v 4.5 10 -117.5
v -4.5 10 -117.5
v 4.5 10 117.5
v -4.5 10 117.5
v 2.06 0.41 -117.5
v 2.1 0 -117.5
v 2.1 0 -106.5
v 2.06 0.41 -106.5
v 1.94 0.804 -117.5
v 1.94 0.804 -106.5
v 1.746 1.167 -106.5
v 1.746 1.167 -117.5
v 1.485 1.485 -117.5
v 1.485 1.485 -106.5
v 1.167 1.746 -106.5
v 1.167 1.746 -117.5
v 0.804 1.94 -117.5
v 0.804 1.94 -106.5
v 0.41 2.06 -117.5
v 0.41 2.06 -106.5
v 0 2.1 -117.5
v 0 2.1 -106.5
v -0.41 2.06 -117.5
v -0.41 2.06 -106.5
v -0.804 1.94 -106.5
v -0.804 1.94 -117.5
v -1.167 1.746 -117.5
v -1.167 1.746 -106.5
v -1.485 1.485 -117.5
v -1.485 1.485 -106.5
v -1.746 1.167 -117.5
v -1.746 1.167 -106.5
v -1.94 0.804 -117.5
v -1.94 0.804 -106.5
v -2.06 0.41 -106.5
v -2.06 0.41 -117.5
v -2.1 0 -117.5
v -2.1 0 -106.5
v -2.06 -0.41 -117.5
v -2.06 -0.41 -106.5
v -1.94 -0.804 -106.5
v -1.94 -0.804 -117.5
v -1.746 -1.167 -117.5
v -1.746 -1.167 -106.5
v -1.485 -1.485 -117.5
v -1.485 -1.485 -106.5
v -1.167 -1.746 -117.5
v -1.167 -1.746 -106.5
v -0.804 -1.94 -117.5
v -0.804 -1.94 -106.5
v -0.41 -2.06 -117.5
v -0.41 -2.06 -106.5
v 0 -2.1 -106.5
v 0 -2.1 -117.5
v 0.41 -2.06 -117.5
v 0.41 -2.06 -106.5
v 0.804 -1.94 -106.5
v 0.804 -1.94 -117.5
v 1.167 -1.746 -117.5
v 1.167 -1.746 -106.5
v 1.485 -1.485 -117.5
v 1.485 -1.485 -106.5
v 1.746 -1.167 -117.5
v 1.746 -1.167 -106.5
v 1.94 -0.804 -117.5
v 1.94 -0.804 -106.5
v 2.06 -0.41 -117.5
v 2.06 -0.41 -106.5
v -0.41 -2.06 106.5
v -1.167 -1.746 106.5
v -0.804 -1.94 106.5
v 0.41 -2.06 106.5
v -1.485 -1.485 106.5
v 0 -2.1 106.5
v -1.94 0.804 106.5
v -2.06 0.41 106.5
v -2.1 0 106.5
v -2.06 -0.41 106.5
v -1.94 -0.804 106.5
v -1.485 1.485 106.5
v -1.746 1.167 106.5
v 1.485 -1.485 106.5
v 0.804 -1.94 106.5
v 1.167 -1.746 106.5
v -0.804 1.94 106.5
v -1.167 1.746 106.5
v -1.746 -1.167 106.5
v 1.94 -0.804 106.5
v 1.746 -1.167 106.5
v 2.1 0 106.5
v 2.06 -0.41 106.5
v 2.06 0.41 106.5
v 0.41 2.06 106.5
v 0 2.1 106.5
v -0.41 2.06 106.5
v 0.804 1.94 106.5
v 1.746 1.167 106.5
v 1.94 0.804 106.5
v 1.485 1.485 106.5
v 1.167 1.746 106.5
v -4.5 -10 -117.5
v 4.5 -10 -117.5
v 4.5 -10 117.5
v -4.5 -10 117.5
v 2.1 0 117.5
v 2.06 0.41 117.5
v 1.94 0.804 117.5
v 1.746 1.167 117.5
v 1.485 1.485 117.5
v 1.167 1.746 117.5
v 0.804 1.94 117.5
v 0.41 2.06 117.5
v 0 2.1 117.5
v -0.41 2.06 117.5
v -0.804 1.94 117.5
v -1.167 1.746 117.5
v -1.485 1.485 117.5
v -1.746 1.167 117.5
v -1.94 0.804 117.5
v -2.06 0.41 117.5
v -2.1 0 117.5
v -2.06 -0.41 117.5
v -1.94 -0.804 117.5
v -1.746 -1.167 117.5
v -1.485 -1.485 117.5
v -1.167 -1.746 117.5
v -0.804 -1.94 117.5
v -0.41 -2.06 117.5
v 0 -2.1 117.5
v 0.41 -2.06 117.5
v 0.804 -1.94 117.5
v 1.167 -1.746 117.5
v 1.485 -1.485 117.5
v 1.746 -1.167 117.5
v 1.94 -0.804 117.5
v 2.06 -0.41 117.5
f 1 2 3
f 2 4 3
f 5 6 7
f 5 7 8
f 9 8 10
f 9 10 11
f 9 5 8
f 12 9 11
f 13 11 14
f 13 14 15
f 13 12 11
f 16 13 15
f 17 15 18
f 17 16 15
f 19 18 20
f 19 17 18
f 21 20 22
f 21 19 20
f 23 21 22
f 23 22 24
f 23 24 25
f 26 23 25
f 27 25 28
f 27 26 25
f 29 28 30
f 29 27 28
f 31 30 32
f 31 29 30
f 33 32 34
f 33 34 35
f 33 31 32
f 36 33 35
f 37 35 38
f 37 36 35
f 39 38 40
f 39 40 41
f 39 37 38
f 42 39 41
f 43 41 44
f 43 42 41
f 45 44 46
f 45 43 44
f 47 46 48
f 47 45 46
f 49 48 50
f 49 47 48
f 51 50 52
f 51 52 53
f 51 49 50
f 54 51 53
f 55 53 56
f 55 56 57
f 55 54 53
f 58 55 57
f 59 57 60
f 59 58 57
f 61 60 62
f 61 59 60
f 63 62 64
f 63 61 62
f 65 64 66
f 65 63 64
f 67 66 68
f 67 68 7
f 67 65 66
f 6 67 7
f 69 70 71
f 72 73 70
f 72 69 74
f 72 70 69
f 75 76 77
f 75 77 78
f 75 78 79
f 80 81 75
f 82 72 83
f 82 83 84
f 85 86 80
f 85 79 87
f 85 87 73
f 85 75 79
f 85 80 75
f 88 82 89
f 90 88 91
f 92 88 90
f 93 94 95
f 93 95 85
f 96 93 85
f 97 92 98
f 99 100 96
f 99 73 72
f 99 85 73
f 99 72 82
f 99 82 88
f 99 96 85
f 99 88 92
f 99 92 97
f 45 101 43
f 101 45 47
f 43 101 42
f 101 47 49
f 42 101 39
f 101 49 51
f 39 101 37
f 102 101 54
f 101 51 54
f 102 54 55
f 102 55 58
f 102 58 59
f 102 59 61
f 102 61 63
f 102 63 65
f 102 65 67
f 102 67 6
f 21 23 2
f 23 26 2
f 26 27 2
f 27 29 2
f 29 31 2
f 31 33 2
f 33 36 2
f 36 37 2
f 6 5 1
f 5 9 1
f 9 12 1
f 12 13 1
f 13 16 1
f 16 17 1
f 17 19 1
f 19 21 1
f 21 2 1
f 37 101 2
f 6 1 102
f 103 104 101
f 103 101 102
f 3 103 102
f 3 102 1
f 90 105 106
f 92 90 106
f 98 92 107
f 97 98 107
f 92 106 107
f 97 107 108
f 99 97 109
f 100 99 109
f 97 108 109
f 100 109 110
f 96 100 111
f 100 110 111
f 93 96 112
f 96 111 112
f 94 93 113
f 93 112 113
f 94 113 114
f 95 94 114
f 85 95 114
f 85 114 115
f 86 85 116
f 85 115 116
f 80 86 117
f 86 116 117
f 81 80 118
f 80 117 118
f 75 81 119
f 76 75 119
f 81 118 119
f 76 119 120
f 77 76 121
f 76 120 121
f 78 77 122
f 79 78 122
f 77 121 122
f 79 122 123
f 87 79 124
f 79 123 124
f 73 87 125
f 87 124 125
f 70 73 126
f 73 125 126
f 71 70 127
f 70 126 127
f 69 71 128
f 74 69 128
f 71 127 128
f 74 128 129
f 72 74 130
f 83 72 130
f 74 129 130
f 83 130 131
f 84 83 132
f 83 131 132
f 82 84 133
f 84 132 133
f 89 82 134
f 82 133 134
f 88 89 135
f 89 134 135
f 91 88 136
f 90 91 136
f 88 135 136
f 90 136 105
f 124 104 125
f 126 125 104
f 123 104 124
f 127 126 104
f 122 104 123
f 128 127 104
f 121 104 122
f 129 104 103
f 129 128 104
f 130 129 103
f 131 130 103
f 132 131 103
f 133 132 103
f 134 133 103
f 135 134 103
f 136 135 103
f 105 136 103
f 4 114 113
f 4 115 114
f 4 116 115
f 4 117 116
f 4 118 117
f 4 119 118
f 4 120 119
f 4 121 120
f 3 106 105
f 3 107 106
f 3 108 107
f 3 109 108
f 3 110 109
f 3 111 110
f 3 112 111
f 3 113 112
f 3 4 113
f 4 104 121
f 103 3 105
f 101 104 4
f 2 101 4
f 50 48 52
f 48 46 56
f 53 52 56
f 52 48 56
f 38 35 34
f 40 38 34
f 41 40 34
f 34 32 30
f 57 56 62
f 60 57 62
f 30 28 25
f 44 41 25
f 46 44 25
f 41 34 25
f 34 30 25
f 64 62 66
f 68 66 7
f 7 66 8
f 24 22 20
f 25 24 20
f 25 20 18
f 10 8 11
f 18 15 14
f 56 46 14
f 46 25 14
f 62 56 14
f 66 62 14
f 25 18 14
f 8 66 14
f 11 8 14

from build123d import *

# Parameters (mm, degrees)
SKETCH1_W           = 9
SKETCH1_H           = 20
BOSS_EXTRUDE1_DEPTH = 117.5
SKETCH2_R           = 2.1
CUT_EXTRUDE1_DEPTH  = 11


with BuildPart() as part:
    # Sketch1 → Boss-Extrude1 (new body, symmetric)
    with BuildSketch(Plane.XY):
        Rectangle(SKETCH1_W, SKETCH1_H)
    extrude(amount=BOSS_EXTRUDE1_DEPTH, both=True)

    # Sketch2 → Cut-Extrude1 (cut)
    with BuildSketch(Plane.XY.offset(117.5)):
        Circle(SKETCH2_R)
    cut_extrude1 = extrude(amount=-CUT_EXTRUDE1_DEPTH, mode=Mode.SUBTRACT)

    # Mirror1: Cut-Extrude1 across plane
    add(cut_extrude1.mirror(Plane.XY), mode=Mode.SUBTRACT)


solid = part.part
